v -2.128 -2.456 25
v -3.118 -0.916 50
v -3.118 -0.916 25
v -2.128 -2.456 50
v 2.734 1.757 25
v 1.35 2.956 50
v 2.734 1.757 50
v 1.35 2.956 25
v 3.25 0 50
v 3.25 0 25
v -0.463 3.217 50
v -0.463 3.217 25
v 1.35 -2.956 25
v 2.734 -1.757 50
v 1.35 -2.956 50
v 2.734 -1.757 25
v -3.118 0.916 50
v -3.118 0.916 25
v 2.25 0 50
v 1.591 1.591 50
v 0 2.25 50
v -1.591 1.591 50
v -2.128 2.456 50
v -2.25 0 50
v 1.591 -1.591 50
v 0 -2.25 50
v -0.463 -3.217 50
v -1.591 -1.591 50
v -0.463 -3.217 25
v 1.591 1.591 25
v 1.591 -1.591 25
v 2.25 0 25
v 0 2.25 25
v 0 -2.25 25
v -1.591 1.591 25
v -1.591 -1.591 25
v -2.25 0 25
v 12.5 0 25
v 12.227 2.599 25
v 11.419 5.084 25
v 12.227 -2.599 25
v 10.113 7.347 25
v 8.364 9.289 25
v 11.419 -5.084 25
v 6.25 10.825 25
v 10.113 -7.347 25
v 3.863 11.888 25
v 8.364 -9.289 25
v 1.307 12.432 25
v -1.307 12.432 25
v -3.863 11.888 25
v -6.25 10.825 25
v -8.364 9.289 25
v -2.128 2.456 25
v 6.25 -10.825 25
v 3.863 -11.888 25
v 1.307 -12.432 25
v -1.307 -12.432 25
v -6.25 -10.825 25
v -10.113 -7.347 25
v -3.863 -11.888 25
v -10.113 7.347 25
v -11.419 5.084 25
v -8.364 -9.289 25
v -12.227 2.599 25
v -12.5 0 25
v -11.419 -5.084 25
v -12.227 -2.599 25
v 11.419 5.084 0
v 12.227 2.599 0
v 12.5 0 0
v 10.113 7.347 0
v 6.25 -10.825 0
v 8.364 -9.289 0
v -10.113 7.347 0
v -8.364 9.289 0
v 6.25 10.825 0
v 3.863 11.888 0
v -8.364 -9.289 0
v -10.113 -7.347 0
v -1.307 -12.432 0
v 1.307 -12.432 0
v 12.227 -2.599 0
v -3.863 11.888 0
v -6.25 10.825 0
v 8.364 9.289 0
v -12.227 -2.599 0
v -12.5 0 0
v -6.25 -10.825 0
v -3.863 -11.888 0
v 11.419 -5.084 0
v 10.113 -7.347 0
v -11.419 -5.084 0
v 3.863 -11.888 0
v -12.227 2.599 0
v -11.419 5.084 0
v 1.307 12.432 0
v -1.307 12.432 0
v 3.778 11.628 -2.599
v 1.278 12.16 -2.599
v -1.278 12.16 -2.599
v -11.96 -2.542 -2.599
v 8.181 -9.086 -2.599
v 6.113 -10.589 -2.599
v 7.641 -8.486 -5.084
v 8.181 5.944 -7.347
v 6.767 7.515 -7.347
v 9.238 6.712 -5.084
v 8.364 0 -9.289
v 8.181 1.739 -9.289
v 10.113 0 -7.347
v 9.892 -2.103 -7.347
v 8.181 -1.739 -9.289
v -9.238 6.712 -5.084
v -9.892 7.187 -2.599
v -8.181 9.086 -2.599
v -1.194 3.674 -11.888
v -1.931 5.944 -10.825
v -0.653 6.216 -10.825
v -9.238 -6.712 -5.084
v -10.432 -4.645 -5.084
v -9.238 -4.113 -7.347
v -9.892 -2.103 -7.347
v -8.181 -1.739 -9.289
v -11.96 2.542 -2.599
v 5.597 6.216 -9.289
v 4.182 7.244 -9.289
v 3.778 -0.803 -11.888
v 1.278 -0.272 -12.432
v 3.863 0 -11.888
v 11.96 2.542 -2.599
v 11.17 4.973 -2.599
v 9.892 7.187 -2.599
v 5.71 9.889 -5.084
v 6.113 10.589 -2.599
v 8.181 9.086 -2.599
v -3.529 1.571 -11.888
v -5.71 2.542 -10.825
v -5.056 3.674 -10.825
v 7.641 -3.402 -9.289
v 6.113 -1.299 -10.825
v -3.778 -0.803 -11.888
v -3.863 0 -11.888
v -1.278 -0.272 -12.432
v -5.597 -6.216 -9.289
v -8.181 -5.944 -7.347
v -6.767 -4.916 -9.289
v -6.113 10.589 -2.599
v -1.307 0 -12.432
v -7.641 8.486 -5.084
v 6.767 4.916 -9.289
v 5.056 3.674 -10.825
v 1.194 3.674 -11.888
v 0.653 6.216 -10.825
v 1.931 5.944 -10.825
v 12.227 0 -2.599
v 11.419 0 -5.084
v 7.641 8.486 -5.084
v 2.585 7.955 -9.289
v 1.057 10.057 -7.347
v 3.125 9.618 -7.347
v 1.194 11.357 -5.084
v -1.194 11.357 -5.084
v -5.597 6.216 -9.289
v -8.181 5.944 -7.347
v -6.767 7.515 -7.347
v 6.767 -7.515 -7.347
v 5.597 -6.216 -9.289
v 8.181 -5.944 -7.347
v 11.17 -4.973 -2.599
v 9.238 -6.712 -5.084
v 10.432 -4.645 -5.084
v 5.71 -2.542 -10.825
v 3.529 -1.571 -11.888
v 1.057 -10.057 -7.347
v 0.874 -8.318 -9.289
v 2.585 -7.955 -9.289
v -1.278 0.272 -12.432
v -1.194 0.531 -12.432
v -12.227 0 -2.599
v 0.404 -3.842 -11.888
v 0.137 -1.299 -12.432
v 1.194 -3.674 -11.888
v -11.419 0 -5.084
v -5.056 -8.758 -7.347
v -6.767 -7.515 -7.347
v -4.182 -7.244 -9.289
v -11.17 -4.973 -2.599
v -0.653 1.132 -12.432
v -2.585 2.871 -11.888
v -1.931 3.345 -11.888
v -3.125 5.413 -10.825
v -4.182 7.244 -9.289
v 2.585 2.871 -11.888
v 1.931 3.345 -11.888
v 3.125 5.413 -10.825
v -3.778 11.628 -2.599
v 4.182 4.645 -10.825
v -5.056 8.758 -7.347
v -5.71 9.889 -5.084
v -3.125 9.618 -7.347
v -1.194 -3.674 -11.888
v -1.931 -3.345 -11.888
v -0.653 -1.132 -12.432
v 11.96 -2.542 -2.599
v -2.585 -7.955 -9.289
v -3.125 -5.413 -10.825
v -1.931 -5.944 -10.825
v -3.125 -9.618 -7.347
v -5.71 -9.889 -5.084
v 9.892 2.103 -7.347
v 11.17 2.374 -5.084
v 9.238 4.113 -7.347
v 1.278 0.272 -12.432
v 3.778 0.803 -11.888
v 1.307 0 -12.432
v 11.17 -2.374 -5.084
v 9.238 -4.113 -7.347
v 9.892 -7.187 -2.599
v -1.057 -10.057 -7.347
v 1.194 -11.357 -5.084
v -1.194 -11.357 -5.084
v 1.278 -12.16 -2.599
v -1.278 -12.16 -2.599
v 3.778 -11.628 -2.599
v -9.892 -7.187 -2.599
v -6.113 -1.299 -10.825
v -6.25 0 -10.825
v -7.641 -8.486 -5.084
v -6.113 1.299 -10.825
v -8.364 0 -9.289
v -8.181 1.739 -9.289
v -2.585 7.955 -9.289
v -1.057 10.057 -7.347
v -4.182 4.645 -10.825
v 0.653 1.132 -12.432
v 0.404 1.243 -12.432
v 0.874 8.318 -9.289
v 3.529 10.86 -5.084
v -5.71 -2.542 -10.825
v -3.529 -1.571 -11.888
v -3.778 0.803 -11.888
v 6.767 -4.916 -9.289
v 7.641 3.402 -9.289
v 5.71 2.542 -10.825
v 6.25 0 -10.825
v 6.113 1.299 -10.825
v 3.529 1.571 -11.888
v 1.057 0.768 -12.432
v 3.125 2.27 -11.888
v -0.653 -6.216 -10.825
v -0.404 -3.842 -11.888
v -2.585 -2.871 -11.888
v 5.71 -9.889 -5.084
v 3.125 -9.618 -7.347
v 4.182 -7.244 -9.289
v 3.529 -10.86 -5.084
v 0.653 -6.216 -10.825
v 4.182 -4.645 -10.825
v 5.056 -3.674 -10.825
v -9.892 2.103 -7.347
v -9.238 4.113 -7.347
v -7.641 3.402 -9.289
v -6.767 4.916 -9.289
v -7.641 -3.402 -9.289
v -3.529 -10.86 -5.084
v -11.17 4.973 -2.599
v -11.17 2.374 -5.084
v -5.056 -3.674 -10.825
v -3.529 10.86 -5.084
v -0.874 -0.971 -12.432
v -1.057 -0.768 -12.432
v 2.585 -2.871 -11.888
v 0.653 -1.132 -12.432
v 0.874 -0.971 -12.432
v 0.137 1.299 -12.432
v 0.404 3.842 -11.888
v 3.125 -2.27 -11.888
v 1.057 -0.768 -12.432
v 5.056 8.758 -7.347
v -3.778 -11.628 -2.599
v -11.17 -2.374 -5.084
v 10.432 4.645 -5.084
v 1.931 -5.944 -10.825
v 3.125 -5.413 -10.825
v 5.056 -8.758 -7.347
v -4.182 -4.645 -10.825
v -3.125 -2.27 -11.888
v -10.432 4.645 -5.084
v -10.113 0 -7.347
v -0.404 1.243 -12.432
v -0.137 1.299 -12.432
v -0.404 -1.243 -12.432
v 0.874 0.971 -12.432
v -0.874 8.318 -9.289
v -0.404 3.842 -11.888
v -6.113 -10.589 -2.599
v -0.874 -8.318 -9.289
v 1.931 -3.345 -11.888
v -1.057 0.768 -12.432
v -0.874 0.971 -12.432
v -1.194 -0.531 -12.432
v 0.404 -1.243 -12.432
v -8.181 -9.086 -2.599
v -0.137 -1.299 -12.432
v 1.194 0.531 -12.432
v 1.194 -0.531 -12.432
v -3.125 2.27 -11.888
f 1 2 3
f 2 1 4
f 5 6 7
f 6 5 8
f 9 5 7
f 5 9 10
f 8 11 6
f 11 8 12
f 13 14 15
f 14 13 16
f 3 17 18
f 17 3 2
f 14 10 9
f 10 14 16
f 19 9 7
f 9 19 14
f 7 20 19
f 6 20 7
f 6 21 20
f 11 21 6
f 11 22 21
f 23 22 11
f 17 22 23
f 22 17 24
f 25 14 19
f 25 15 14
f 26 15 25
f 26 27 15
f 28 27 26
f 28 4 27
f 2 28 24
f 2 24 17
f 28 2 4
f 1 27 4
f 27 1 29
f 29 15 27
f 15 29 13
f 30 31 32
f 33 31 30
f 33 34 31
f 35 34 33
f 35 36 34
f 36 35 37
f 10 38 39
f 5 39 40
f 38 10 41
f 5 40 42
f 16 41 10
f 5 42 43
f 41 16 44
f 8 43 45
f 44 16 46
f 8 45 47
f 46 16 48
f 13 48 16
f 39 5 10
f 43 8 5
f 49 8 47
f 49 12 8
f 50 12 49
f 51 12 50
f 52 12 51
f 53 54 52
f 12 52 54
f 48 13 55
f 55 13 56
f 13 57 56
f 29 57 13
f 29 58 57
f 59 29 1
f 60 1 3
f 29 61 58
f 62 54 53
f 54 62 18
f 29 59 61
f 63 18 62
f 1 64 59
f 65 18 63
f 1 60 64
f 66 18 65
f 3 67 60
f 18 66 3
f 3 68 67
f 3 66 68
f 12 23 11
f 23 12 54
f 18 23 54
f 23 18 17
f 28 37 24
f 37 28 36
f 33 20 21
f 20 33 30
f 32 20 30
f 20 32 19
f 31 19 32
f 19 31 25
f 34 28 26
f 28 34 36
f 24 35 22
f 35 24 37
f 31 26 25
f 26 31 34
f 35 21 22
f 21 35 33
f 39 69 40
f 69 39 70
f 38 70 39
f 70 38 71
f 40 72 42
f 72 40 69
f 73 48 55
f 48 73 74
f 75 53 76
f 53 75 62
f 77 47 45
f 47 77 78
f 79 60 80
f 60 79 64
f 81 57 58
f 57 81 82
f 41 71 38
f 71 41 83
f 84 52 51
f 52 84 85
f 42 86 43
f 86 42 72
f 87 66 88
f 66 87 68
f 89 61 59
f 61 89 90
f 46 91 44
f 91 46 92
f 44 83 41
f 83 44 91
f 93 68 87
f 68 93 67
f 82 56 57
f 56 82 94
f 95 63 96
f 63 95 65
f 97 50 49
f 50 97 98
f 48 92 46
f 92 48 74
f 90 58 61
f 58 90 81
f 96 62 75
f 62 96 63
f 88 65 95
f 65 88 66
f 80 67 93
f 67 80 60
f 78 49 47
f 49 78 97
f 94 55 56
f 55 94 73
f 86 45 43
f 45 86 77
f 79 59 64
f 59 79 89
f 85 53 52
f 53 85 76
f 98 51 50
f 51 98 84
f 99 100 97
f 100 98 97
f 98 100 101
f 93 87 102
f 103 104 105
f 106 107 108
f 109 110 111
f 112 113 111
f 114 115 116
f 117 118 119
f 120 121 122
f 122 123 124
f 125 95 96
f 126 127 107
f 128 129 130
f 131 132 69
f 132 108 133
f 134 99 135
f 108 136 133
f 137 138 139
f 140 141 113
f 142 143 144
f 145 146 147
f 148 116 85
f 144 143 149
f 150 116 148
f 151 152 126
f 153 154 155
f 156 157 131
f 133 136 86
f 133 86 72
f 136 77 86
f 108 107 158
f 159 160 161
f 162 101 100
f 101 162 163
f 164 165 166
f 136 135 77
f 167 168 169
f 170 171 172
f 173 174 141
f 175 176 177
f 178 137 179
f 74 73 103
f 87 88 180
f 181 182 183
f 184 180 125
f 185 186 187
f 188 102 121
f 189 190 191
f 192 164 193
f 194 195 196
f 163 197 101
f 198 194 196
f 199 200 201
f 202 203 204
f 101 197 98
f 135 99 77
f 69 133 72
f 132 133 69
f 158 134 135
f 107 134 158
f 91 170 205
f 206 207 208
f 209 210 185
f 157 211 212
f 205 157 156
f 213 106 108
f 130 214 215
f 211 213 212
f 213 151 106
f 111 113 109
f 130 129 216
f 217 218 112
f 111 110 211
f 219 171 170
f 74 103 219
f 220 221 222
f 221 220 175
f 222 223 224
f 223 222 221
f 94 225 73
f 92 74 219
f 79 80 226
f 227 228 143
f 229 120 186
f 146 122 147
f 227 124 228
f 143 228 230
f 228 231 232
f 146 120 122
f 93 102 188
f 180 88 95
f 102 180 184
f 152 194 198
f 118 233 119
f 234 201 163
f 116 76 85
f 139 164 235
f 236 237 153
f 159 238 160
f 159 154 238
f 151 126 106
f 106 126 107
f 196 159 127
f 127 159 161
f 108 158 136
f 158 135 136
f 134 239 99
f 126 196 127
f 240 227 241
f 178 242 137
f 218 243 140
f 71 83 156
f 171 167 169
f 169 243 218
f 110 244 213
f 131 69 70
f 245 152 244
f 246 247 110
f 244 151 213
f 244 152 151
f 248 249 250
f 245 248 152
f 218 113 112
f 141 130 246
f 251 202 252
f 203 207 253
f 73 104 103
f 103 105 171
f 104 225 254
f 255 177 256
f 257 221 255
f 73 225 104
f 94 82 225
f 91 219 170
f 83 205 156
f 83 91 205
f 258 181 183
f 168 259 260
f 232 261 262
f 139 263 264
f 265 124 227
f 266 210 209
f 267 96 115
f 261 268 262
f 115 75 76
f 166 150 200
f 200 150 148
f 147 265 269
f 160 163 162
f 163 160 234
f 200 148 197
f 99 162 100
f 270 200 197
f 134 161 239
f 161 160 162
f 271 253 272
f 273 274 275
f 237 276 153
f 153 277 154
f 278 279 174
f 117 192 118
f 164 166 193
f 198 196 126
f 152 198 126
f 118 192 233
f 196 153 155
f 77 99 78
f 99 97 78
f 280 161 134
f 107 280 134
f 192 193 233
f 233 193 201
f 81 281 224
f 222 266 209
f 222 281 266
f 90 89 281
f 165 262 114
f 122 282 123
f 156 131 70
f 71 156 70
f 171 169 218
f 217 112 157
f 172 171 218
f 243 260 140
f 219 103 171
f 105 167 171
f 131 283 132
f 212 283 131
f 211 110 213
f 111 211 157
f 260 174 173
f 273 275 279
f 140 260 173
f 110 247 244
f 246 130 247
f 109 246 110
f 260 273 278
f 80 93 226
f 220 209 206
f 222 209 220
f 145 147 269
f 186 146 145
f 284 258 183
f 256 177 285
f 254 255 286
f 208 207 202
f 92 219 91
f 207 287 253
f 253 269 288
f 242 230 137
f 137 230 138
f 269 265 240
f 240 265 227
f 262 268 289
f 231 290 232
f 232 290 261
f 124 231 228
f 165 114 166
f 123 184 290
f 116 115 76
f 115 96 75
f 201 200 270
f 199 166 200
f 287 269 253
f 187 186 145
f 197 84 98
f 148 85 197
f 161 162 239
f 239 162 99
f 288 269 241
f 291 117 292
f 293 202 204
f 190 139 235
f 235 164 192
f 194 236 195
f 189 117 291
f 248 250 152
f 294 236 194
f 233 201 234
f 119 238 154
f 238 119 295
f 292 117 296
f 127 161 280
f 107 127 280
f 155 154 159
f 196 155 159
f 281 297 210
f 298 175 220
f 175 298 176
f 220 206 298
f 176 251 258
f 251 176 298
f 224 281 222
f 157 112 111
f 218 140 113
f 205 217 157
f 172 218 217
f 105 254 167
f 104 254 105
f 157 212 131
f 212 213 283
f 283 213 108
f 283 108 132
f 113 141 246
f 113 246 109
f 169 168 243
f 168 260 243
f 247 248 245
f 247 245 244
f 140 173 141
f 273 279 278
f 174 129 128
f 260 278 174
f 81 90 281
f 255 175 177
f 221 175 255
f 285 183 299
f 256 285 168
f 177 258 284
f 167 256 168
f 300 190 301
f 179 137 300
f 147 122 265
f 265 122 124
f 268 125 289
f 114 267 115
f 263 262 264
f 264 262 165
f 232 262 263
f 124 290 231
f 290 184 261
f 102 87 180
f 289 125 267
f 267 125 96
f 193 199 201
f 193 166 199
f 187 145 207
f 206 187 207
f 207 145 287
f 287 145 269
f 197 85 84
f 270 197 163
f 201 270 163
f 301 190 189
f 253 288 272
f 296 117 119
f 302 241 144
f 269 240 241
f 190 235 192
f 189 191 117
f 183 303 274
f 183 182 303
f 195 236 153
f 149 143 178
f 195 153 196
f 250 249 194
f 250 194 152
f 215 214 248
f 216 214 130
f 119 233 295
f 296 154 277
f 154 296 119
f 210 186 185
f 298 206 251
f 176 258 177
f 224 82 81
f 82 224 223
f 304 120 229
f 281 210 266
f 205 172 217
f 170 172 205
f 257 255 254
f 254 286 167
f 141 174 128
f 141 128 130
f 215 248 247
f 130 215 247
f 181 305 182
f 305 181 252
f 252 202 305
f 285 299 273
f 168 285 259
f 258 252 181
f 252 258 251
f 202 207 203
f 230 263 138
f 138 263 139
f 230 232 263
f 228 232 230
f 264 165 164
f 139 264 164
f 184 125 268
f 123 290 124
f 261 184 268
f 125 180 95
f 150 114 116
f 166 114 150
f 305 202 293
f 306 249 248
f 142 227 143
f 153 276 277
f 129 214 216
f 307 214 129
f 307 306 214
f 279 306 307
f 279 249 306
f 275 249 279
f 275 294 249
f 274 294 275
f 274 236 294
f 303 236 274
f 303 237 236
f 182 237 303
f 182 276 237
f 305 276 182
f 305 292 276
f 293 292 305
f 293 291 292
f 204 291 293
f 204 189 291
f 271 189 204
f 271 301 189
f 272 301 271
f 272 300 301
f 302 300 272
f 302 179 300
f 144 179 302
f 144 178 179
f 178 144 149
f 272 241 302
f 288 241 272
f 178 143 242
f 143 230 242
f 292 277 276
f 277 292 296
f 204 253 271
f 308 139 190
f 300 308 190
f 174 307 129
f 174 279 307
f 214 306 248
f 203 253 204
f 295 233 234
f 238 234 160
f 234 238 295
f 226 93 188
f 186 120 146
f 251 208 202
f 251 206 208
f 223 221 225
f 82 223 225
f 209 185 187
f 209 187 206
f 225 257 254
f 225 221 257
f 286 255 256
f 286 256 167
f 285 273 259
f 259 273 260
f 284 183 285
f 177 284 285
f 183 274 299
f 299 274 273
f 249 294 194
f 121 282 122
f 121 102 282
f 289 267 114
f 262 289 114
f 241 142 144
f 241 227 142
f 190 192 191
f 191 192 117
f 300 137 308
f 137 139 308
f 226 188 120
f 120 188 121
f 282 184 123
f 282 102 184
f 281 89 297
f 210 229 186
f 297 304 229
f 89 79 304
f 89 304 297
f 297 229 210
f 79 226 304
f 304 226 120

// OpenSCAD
/*
    So let's try the pegboard version
    
    How many holes in 3'x6' of pegboard?
    holes are 1/4" (6.35mm)
    holes are 1" apart (25.4mm) on-center
    board is 1/4" thick (6.35mm)
    
    So if the holes are 1" apart, there should be 12 holes per foot, and 144 holes per square foot?
    
    We have 18 square feet, so if that's right we need 2592 pins?
    
    Double that for estimates as this model is of one side of one pin, so 5184 parts.
    
    time and materials per part: 23 min 5.82g
    total time: 82.8 days
    total materials: 30.17kg
    
    ok how about no infill?
    time and materials: 19 min 3.96g
    total time: 68.4 days
    total materials: 20kg
    
    so the pegs need to be two-part, and need to move let's say 1" (25.4mm)
    
*/
WALL_THICKNESS = 1;
SHAFT_DIAMETER = 6.5;//5.4;

/*
// solid shaft
translate([0,0,25]){
    //cylinder(r=SHAFT_DIAMETER/2,h=25);
    cylinder(r=(SHAFT_DIAMETER-(WALL_THICKNESS*2))/2,h=10);
}
*/


// hollow shaft
translate([0,0,25]){
    difference(){
        cylinder(r=SHAFT_DIAMETER/2,h=25);
        
        translate([0,0,0]){
            cylinder(r=(SHAFT_DIAMETER-(WALL_THICKNESS*2))/2,h=25);
        }
    }
}


// head
cylinder(r=25/2,h=25);

sphere(25/2);
